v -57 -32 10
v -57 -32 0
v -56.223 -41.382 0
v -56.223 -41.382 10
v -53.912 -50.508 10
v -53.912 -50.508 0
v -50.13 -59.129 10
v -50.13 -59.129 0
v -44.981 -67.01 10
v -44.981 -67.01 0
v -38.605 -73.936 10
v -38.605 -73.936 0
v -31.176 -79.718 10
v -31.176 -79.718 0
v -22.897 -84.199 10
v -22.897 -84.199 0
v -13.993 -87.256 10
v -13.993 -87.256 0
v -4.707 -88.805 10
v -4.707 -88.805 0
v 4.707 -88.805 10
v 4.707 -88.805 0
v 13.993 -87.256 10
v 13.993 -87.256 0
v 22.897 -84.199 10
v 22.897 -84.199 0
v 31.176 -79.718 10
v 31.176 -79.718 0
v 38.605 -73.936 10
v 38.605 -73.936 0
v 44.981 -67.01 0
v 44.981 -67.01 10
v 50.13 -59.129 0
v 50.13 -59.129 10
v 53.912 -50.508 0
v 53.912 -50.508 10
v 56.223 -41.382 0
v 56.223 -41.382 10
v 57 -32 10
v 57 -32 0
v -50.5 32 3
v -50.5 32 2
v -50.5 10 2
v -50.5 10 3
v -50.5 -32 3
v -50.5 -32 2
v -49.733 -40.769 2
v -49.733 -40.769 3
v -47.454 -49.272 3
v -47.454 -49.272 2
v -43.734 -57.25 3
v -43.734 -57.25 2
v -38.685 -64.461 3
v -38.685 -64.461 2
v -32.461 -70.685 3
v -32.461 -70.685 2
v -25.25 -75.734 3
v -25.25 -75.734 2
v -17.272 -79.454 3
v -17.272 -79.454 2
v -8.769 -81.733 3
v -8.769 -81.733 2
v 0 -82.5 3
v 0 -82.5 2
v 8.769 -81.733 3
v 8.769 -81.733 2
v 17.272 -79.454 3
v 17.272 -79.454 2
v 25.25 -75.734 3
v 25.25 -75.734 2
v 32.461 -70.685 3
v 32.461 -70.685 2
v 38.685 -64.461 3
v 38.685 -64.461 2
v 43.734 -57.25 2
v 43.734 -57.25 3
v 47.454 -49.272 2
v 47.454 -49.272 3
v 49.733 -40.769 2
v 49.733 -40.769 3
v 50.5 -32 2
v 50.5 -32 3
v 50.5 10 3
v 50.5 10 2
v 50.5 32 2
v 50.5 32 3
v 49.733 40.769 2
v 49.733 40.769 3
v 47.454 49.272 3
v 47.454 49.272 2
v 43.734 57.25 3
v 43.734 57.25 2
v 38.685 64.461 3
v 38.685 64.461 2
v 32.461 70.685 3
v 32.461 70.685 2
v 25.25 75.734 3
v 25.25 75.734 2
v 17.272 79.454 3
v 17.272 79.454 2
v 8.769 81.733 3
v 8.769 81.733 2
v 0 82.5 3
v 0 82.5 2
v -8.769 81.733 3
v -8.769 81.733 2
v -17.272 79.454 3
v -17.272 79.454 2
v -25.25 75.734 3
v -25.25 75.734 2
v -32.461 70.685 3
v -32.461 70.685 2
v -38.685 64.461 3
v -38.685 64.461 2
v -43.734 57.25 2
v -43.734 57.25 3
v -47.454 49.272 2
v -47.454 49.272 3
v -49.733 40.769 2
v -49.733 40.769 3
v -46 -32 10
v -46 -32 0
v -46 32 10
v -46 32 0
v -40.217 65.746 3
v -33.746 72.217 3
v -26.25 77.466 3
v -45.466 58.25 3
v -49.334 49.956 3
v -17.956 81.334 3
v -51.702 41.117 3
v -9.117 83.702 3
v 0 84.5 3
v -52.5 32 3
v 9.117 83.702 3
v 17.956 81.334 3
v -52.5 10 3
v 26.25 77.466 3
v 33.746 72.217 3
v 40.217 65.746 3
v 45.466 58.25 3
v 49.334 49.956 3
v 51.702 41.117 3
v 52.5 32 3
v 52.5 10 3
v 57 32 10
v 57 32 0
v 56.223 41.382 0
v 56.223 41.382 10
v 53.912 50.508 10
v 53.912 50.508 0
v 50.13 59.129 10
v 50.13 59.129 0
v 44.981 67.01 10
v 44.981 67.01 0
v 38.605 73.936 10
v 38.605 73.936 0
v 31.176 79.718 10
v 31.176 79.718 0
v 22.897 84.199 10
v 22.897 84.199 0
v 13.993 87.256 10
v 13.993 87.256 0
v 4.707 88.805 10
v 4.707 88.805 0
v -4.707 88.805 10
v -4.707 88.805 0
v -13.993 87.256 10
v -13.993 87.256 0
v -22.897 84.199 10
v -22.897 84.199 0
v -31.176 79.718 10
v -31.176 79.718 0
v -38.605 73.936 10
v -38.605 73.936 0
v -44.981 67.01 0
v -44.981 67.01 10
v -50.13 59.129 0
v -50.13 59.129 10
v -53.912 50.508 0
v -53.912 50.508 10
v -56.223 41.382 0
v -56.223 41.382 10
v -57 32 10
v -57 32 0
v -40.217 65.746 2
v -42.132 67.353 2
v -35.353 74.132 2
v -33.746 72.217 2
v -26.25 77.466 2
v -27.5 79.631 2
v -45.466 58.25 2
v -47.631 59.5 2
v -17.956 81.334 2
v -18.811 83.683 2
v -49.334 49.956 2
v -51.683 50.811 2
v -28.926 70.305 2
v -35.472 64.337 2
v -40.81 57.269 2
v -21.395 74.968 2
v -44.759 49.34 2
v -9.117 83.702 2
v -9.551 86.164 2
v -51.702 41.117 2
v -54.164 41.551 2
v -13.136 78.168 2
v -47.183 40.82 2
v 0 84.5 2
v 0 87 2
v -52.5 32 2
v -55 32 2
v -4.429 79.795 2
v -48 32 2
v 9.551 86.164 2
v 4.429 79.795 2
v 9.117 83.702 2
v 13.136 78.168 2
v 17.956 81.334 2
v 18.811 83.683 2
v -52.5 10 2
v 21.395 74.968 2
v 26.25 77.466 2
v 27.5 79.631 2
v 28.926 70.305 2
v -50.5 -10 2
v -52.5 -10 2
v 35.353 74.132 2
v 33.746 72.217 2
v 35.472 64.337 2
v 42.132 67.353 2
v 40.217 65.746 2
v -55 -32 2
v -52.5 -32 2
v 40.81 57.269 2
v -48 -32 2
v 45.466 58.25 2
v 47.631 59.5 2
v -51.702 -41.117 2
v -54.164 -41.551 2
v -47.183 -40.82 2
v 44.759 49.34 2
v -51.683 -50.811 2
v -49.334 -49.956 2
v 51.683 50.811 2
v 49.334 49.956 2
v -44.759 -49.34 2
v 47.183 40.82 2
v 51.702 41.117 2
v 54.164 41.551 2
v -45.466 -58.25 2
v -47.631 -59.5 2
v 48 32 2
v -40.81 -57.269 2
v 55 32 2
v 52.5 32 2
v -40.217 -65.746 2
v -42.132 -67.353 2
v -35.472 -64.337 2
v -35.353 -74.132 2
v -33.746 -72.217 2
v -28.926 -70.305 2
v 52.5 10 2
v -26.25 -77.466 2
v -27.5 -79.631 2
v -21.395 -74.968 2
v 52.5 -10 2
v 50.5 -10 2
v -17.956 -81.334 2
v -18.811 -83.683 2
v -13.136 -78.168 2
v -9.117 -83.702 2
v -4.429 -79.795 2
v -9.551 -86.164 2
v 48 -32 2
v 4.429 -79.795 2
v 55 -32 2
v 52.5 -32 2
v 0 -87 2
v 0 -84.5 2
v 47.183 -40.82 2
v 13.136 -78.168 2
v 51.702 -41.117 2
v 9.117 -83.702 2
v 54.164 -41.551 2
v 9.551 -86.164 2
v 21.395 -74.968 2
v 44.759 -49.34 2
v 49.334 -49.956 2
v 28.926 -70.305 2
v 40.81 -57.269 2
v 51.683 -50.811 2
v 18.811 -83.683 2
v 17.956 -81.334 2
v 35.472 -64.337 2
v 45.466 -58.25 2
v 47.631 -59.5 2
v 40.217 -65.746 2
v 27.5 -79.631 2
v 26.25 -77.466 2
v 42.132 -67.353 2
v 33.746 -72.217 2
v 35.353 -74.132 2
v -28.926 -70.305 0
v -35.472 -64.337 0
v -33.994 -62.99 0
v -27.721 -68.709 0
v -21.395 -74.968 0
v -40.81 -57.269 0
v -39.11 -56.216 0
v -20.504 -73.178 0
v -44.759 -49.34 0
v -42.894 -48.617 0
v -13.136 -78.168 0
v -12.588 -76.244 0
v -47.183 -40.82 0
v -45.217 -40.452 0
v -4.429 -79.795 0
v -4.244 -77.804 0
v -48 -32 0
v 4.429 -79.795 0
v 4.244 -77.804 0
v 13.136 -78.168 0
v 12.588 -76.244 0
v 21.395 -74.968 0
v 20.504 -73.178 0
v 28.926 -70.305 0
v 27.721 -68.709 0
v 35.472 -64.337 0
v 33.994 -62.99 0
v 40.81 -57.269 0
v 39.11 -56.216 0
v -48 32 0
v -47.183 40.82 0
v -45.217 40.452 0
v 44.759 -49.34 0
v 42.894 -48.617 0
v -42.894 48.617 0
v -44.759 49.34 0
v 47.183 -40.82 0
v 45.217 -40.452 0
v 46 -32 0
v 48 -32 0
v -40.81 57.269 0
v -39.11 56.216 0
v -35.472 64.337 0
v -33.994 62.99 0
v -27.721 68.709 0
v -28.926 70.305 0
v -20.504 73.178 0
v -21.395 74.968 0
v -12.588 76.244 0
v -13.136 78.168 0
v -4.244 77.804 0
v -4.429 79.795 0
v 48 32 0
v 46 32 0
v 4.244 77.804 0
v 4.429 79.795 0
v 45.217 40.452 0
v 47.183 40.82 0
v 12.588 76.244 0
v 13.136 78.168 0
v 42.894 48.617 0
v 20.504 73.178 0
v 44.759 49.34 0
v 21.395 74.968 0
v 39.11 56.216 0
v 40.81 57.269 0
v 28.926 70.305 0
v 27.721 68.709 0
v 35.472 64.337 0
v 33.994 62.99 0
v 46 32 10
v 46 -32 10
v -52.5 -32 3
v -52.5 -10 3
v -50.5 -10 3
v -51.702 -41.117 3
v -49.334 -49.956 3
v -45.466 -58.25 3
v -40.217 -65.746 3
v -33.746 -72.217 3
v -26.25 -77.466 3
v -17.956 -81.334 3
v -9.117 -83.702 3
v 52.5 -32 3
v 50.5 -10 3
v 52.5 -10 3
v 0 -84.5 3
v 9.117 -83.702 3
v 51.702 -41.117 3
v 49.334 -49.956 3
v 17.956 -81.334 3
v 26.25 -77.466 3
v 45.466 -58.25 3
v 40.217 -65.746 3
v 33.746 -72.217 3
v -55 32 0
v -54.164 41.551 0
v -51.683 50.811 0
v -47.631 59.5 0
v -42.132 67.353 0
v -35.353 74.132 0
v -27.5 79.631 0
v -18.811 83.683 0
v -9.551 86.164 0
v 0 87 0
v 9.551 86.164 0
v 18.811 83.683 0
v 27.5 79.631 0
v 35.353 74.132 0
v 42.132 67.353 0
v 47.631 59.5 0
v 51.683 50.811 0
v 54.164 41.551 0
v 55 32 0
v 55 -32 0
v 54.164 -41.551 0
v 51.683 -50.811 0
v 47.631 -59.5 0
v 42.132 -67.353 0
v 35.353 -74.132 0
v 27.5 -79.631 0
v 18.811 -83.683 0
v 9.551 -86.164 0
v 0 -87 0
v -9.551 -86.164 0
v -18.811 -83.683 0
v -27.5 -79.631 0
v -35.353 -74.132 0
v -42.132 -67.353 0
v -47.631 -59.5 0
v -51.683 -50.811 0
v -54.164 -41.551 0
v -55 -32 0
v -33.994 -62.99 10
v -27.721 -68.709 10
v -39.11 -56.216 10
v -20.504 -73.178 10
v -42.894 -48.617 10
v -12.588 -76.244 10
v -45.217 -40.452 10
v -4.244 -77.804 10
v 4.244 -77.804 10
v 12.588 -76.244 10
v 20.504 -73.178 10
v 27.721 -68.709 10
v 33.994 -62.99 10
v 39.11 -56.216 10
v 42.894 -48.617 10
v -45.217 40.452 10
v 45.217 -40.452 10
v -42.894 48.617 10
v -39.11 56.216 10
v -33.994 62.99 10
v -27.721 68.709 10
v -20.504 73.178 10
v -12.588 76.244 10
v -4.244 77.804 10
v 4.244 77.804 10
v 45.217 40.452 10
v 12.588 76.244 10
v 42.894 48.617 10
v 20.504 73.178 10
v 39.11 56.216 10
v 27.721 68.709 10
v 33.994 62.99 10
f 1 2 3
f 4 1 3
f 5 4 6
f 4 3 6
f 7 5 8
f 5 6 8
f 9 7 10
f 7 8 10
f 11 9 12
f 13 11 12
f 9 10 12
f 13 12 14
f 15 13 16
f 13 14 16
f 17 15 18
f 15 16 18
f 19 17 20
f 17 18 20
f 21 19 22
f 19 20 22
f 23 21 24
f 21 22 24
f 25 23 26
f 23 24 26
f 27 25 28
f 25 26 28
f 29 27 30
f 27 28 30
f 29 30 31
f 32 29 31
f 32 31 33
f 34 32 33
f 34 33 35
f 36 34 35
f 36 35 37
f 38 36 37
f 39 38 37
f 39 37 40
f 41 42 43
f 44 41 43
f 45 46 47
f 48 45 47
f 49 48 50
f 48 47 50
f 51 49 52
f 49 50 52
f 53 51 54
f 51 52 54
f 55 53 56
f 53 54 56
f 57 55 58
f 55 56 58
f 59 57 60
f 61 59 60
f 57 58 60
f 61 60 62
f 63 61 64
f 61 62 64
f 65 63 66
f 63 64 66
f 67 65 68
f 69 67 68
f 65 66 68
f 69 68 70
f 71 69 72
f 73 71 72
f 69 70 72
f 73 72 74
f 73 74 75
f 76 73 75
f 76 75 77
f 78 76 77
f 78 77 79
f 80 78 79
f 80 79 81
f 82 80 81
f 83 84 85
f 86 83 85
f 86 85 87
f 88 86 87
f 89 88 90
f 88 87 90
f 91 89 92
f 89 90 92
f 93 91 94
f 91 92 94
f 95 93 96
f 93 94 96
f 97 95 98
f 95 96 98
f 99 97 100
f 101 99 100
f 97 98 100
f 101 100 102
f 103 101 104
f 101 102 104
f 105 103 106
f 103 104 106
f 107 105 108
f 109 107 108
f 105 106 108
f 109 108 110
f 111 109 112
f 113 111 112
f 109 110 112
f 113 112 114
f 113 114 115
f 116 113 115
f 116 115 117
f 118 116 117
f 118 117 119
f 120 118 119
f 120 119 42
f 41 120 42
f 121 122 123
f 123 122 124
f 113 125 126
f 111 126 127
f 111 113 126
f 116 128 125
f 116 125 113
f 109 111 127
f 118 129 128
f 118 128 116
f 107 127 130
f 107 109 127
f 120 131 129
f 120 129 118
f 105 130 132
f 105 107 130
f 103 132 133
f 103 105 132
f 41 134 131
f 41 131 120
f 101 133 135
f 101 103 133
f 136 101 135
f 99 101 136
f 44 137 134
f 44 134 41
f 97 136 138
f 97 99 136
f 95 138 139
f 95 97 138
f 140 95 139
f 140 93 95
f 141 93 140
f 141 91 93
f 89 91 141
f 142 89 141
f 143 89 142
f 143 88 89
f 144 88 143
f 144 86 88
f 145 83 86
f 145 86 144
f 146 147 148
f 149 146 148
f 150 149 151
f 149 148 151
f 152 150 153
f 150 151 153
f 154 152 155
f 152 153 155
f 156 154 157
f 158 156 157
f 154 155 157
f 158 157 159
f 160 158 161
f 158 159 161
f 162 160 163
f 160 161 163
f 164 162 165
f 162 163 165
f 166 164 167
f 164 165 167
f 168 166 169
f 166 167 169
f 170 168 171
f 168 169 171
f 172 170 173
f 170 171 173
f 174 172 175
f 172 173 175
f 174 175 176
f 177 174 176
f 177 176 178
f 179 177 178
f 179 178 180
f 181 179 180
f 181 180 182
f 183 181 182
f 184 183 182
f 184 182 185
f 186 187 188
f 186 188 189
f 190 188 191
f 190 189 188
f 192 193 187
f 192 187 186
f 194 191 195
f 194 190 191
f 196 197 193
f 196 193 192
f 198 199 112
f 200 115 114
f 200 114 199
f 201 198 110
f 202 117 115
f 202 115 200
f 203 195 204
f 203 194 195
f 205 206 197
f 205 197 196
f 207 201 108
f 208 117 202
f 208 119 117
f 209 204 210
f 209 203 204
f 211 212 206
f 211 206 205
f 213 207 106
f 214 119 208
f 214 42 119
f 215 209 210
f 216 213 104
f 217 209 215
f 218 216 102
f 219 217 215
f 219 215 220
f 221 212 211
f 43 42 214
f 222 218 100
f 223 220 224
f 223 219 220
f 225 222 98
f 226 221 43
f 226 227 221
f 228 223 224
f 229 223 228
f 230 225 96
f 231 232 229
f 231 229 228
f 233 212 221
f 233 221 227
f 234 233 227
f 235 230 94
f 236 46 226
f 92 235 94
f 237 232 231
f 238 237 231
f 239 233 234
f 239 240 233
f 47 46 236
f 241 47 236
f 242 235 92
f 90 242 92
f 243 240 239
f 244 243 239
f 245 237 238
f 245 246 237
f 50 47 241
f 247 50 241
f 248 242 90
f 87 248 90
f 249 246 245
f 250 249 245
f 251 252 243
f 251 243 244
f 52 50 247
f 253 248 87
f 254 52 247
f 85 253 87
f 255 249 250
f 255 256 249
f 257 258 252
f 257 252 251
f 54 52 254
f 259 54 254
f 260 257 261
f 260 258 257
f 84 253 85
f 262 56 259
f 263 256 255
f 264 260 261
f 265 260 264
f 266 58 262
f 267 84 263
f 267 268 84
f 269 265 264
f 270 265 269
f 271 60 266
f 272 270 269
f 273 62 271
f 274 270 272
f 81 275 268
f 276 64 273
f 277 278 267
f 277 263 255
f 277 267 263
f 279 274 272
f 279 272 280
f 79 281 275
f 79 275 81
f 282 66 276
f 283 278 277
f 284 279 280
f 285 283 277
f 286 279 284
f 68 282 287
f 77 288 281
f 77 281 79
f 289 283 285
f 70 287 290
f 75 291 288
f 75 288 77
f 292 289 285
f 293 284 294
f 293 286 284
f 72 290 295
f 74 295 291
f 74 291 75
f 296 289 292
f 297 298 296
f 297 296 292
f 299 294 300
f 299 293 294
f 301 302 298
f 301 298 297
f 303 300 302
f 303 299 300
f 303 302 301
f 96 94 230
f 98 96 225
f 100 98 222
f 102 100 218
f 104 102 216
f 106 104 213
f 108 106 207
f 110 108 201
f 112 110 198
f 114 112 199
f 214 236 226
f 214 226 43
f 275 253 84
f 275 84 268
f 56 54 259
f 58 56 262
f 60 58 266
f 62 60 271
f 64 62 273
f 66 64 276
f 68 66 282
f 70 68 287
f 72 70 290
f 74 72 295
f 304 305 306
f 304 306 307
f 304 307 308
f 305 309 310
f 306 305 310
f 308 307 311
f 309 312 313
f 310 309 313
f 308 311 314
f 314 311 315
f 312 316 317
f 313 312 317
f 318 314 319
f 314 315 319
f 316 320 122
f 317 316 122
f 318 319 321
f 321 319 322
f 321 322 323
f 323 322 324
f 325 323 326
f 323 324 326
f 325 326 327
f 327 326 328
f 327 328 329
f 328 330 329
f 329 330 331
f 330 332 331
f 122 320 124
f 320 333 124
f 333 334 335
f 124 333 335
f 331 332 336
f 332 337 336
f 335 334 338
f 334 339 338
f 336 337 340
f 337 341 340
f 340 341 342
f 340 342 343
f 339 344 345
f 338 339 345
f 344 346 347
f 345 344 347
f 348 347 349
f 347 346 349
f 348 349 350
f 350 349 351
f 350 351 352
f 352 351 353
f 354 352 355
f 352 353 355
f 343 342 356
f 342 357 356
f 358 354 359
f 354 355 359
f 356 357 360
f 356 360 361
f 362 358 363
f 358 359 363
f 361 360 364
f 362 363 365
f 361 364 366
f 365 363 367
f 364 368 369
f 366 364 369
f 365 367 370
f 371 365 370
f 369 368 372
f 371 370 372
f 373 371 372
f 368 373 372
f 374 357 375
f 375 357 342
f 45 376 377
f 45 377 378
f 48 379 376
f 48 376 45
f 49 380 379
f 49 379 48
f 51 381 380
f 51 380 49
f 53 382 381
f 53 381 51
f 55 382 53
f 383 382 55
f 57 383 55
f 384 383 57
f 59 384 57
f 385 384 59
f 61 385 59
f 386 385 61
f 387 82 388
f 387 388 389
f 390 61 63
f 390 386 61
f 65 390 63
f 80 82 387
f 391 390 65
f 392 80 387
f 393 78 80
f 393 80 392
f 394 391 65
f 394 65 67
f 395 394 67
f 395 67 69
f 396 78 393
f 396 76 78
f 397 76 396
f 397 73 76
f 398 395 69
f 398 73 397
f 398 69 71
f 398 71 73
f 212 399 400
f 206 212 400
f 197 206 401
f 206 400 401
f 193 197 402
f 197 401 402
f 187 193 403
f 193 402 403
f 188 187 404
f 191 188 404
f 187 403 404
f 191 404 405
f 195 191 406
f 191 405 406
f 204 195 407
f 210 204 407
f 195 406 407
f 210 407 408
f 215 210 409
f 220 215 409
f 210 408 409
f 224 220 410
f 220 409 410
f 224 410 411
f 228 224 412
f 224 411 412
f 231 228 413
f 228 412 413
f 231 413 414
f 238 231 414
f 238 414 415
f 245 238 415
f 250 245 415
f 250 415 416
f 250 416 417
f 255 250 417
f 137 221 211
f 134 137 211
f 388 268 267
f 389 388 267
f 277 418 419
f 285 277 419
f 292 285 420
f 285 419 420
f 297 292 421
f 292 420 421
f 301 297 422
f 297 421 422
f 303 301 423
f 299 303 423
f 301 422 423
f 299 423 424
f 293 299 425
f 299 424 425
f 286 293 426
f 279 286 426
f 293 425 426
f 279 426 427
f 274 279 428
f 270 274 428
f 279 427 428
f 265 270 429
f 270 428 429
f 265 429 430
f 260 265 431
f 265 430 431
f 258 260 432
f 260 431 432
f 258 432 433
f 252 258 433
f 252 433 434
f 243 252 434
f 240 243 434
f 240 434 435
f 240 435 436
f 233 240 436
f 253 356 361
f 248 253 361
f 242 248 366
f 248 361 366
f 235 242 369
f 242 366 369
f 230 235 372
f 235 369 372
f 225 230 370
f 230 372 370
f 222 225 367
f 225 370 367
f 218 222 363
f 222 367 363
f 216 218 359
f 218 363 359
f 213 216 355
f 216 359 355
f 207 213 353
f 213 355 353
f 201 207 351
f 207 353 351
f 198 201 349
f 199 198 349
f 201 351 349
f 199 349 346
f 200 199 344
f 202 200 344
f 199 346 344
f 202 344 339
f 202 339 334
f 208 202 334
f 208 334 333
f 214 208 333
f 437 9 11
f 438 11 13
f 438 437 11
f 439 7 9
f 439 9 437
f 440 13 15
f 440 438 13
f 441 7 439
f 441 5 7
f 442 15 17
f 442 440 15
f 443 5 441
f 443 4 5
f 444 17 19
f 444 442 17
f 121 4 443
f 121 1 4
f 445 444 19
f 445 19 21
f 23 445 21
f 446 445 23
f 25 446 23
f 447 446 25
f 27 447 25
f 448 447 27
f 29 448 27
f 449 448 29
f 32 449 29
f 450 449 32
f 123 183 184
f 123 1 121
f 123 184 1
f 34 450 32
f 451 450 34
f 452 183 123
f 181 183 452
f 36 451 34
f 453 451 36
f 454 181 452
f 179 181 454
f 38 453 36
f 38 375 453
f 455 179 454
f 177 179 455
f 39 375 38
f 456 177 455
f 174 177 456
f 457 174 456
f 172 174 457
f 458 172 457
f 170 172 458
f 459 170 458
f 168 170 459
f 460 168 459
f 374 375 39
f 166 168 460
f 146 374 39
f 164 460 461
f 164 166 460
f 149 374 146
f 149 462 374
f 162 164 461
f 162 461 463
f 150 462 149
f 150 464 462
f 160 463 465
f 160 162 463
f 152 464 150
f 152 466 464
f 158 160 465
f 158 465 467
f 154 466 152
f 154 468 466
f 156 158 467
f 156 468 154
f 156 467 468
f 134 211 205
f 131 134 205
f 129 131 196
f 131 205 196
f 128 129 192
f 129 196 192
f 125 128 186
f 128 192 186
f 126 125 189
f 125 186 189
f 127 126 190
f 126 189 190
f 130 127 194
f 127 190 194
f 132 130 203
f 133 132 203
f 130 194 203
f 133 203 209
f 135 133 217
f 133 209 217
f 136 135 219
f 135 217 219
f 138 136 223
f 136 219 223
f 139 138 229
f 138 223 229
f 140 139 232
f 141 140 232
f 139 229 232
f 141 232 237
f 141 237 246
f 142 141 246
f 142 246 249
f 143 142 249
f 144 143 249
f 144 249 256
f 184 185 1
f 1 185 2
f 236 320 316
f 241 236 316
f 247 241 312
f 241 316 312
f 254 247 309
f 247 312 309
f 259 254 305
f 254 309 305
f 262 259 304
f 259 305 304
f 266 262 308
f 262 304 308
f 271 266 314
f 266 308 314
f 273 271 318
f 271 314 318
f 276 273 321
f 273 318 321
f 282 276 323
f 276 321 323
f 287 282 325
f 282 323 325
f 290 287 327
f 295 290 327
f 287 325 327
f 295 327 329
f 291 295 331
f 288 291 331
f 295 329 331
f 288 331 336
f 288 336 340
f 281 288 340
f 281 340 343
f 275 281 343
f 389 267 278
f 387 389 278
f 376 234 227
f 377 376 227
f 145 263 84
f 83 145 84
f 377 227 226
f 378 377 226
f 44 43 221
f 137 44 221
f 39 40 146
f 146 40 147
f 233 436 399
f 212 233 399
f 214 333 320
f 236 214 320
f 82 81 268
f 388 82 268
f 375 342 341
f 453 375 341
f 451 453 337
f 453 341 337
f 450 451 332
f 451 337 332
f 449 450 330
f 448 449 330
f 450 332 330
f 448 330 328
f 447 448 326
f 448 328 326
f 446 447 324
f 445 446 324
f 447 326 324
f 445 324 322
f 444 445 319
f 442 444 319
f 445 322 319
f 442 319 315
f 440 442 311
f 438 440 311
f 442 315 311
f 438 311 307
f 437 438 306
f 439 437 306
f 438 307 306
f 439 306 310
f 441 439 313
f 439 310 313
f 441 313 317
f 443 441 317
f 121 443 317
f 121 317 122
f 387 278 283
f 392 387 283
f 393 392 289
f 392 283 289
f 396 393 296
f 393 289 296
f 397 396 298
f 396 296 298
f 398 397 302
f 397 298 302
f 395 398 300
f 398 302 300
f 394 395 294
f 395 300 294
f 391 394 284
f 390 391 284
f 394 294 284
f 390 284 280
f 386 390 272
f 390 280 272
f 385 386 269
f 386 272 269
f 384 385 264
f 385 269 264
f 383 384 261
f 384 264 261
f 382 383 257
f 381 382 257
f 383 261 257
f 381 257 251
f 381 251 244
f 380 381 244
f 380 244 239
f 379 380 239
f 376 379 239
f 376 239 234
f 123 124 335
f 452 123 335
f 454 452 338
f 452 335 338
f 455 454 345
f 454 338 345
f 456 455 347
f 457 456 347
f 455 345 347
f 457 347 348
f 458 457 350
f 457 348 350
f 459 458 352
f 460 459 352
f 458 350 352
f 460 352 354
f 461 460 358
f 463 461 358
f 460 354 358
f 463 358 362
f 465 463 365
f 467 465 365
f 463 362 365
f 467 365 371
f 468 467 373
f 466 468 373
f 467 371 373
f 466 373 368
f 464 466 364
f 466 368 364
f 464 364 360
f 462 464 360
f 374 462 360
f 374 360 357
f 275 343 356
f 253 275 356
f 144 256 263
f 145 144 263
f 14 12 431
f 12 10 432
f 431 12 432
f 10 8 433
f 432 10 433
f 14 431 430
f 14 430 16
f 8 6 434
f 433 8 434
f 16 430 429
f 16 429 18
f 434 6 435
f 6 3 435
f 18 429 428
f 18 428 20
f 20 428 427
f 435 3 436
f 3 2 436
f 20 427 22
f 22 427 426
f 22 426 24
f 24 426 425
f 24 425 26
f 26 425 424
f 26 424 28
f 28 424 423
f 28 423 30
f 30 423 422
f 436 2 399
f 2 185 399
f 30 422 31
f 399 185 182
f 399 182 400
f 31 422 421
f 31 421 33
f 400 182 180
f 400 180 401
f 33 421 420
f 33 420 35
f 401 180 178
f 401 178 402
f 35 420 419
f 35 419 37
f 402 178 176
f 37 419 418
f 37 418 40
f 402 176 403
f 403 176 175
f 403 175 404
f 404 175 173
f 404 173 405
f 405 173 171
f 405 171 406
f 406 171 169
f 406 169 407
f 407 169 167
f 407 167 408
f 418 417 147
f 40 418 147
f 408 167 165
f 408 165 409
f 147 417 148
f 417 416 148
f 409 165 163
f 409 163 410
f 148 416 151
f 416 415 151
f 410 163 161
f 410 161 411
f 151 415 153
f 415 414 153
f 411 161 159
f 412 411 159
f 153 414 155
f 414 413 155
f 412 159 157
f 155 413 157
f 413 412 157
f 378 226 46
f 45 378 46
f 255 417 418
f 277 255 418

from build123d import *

# Parameters (mm, degrees)
F1_DEPTH = 10
F3_DEPTH = 2
F5_DEPTH = 1


with BuildPart() as f1:
    # F0 (on Top) → F1 (new body)
    with BuildSketch(Plane.XY):
        with BuildLine():
            ThreePointArc((57, 32), (0, 89), (-57, 32))
            Line((-57, 32), (-57, -32))
            ThreePointArc((-57, -32), (0, -89), (57, -32))
            Line((57, -32), (57, 32))
        make_face()
        with BuildLine():
            ThreePointArc((-46, 32), (0, 78), (46, 32))
            Line((46, 32), (46, -32))
            ThreePointArc((46, -32), (0, -78), (-46, -32))
            Line((-46, -32), (-46, 32))
        make_face(mode=Mode.SUBTRACT)
    extrude(amount=F1_DEPTH)

    # F2 (on face) → F3 (cut)
    with BuildSketch(Plane(origin=(0, 0, 0), x_dir=(1, 0, 0), z_dir=(0, 0, -1))):
        with BuildLine():
            ThreePointArc((55, 32), (0, 87), (-55, 32))
            Line((-55, 32), (-55, -32))
            ThreePointArc((-55, -32), (0, -87), (55, -32))
            Line((55, -32), (55, 32))
        make_face()
        with BuildLine():
            Line((-48, -32), (-48, 32))
            ThreePointArc((-48, 32), (0, 80), (48, 32))
            Line((48, 32), (48, -32))
            ThreePointArc((48, -32), (0, -80), (-48, -32))
        make_face(mode=Mode.SUBTRACT)
    extrude(amount=-F3_DEPTH, mode=Mode.SUBTRACT)

    # F4 (on face) → F5 (cut)
    with BuildSketch(Plane(origin=(0, 0, 2), x_dir=(1, 0, 0), z_dir=(0, 0, -1))):
        with BuildLine():
            Line((52.5, 10), (52.5, 32))
            ThreePointArc((52.5, 32), (0, 84.5), (-52.5, 32))
            Line((-52.5, 32), (-52.5, 10))
            Line((-52.5, 10), (-50.5, 10))
            Line((-50.5, 10), (-50.5, 32))
            ThreePointArc((-50.5, 32), (0, 82.5), (50.5, 32))
            Line((50.5, 32), (50.5, 10))
            Line((50.5, 10), (52.5, 10))
        make_face()
        with BuildLine():
            Line((-52.5, -10), (-52.5, -32))
            ThreePointArc((-52.5, -32), (0, -84.5), (52.5, -32))
            Line((52.5, -32), (52.5, -10))
            Line((52.5, -10), (50.5, -10))
            Line((50.5, -10), (50.5, -32))
            ThreePointArc((50.5, -32), (0, -82.5), (-50.5, -32))
            Line((-50.5, -32), (-50.5, -10))
            Line((-50.5, -10), (-52.5, -10))
        make_face()
    extrude(amount=-F5_DEPTH, mode=Mode.SUBTRACT)


solid = f1.part
